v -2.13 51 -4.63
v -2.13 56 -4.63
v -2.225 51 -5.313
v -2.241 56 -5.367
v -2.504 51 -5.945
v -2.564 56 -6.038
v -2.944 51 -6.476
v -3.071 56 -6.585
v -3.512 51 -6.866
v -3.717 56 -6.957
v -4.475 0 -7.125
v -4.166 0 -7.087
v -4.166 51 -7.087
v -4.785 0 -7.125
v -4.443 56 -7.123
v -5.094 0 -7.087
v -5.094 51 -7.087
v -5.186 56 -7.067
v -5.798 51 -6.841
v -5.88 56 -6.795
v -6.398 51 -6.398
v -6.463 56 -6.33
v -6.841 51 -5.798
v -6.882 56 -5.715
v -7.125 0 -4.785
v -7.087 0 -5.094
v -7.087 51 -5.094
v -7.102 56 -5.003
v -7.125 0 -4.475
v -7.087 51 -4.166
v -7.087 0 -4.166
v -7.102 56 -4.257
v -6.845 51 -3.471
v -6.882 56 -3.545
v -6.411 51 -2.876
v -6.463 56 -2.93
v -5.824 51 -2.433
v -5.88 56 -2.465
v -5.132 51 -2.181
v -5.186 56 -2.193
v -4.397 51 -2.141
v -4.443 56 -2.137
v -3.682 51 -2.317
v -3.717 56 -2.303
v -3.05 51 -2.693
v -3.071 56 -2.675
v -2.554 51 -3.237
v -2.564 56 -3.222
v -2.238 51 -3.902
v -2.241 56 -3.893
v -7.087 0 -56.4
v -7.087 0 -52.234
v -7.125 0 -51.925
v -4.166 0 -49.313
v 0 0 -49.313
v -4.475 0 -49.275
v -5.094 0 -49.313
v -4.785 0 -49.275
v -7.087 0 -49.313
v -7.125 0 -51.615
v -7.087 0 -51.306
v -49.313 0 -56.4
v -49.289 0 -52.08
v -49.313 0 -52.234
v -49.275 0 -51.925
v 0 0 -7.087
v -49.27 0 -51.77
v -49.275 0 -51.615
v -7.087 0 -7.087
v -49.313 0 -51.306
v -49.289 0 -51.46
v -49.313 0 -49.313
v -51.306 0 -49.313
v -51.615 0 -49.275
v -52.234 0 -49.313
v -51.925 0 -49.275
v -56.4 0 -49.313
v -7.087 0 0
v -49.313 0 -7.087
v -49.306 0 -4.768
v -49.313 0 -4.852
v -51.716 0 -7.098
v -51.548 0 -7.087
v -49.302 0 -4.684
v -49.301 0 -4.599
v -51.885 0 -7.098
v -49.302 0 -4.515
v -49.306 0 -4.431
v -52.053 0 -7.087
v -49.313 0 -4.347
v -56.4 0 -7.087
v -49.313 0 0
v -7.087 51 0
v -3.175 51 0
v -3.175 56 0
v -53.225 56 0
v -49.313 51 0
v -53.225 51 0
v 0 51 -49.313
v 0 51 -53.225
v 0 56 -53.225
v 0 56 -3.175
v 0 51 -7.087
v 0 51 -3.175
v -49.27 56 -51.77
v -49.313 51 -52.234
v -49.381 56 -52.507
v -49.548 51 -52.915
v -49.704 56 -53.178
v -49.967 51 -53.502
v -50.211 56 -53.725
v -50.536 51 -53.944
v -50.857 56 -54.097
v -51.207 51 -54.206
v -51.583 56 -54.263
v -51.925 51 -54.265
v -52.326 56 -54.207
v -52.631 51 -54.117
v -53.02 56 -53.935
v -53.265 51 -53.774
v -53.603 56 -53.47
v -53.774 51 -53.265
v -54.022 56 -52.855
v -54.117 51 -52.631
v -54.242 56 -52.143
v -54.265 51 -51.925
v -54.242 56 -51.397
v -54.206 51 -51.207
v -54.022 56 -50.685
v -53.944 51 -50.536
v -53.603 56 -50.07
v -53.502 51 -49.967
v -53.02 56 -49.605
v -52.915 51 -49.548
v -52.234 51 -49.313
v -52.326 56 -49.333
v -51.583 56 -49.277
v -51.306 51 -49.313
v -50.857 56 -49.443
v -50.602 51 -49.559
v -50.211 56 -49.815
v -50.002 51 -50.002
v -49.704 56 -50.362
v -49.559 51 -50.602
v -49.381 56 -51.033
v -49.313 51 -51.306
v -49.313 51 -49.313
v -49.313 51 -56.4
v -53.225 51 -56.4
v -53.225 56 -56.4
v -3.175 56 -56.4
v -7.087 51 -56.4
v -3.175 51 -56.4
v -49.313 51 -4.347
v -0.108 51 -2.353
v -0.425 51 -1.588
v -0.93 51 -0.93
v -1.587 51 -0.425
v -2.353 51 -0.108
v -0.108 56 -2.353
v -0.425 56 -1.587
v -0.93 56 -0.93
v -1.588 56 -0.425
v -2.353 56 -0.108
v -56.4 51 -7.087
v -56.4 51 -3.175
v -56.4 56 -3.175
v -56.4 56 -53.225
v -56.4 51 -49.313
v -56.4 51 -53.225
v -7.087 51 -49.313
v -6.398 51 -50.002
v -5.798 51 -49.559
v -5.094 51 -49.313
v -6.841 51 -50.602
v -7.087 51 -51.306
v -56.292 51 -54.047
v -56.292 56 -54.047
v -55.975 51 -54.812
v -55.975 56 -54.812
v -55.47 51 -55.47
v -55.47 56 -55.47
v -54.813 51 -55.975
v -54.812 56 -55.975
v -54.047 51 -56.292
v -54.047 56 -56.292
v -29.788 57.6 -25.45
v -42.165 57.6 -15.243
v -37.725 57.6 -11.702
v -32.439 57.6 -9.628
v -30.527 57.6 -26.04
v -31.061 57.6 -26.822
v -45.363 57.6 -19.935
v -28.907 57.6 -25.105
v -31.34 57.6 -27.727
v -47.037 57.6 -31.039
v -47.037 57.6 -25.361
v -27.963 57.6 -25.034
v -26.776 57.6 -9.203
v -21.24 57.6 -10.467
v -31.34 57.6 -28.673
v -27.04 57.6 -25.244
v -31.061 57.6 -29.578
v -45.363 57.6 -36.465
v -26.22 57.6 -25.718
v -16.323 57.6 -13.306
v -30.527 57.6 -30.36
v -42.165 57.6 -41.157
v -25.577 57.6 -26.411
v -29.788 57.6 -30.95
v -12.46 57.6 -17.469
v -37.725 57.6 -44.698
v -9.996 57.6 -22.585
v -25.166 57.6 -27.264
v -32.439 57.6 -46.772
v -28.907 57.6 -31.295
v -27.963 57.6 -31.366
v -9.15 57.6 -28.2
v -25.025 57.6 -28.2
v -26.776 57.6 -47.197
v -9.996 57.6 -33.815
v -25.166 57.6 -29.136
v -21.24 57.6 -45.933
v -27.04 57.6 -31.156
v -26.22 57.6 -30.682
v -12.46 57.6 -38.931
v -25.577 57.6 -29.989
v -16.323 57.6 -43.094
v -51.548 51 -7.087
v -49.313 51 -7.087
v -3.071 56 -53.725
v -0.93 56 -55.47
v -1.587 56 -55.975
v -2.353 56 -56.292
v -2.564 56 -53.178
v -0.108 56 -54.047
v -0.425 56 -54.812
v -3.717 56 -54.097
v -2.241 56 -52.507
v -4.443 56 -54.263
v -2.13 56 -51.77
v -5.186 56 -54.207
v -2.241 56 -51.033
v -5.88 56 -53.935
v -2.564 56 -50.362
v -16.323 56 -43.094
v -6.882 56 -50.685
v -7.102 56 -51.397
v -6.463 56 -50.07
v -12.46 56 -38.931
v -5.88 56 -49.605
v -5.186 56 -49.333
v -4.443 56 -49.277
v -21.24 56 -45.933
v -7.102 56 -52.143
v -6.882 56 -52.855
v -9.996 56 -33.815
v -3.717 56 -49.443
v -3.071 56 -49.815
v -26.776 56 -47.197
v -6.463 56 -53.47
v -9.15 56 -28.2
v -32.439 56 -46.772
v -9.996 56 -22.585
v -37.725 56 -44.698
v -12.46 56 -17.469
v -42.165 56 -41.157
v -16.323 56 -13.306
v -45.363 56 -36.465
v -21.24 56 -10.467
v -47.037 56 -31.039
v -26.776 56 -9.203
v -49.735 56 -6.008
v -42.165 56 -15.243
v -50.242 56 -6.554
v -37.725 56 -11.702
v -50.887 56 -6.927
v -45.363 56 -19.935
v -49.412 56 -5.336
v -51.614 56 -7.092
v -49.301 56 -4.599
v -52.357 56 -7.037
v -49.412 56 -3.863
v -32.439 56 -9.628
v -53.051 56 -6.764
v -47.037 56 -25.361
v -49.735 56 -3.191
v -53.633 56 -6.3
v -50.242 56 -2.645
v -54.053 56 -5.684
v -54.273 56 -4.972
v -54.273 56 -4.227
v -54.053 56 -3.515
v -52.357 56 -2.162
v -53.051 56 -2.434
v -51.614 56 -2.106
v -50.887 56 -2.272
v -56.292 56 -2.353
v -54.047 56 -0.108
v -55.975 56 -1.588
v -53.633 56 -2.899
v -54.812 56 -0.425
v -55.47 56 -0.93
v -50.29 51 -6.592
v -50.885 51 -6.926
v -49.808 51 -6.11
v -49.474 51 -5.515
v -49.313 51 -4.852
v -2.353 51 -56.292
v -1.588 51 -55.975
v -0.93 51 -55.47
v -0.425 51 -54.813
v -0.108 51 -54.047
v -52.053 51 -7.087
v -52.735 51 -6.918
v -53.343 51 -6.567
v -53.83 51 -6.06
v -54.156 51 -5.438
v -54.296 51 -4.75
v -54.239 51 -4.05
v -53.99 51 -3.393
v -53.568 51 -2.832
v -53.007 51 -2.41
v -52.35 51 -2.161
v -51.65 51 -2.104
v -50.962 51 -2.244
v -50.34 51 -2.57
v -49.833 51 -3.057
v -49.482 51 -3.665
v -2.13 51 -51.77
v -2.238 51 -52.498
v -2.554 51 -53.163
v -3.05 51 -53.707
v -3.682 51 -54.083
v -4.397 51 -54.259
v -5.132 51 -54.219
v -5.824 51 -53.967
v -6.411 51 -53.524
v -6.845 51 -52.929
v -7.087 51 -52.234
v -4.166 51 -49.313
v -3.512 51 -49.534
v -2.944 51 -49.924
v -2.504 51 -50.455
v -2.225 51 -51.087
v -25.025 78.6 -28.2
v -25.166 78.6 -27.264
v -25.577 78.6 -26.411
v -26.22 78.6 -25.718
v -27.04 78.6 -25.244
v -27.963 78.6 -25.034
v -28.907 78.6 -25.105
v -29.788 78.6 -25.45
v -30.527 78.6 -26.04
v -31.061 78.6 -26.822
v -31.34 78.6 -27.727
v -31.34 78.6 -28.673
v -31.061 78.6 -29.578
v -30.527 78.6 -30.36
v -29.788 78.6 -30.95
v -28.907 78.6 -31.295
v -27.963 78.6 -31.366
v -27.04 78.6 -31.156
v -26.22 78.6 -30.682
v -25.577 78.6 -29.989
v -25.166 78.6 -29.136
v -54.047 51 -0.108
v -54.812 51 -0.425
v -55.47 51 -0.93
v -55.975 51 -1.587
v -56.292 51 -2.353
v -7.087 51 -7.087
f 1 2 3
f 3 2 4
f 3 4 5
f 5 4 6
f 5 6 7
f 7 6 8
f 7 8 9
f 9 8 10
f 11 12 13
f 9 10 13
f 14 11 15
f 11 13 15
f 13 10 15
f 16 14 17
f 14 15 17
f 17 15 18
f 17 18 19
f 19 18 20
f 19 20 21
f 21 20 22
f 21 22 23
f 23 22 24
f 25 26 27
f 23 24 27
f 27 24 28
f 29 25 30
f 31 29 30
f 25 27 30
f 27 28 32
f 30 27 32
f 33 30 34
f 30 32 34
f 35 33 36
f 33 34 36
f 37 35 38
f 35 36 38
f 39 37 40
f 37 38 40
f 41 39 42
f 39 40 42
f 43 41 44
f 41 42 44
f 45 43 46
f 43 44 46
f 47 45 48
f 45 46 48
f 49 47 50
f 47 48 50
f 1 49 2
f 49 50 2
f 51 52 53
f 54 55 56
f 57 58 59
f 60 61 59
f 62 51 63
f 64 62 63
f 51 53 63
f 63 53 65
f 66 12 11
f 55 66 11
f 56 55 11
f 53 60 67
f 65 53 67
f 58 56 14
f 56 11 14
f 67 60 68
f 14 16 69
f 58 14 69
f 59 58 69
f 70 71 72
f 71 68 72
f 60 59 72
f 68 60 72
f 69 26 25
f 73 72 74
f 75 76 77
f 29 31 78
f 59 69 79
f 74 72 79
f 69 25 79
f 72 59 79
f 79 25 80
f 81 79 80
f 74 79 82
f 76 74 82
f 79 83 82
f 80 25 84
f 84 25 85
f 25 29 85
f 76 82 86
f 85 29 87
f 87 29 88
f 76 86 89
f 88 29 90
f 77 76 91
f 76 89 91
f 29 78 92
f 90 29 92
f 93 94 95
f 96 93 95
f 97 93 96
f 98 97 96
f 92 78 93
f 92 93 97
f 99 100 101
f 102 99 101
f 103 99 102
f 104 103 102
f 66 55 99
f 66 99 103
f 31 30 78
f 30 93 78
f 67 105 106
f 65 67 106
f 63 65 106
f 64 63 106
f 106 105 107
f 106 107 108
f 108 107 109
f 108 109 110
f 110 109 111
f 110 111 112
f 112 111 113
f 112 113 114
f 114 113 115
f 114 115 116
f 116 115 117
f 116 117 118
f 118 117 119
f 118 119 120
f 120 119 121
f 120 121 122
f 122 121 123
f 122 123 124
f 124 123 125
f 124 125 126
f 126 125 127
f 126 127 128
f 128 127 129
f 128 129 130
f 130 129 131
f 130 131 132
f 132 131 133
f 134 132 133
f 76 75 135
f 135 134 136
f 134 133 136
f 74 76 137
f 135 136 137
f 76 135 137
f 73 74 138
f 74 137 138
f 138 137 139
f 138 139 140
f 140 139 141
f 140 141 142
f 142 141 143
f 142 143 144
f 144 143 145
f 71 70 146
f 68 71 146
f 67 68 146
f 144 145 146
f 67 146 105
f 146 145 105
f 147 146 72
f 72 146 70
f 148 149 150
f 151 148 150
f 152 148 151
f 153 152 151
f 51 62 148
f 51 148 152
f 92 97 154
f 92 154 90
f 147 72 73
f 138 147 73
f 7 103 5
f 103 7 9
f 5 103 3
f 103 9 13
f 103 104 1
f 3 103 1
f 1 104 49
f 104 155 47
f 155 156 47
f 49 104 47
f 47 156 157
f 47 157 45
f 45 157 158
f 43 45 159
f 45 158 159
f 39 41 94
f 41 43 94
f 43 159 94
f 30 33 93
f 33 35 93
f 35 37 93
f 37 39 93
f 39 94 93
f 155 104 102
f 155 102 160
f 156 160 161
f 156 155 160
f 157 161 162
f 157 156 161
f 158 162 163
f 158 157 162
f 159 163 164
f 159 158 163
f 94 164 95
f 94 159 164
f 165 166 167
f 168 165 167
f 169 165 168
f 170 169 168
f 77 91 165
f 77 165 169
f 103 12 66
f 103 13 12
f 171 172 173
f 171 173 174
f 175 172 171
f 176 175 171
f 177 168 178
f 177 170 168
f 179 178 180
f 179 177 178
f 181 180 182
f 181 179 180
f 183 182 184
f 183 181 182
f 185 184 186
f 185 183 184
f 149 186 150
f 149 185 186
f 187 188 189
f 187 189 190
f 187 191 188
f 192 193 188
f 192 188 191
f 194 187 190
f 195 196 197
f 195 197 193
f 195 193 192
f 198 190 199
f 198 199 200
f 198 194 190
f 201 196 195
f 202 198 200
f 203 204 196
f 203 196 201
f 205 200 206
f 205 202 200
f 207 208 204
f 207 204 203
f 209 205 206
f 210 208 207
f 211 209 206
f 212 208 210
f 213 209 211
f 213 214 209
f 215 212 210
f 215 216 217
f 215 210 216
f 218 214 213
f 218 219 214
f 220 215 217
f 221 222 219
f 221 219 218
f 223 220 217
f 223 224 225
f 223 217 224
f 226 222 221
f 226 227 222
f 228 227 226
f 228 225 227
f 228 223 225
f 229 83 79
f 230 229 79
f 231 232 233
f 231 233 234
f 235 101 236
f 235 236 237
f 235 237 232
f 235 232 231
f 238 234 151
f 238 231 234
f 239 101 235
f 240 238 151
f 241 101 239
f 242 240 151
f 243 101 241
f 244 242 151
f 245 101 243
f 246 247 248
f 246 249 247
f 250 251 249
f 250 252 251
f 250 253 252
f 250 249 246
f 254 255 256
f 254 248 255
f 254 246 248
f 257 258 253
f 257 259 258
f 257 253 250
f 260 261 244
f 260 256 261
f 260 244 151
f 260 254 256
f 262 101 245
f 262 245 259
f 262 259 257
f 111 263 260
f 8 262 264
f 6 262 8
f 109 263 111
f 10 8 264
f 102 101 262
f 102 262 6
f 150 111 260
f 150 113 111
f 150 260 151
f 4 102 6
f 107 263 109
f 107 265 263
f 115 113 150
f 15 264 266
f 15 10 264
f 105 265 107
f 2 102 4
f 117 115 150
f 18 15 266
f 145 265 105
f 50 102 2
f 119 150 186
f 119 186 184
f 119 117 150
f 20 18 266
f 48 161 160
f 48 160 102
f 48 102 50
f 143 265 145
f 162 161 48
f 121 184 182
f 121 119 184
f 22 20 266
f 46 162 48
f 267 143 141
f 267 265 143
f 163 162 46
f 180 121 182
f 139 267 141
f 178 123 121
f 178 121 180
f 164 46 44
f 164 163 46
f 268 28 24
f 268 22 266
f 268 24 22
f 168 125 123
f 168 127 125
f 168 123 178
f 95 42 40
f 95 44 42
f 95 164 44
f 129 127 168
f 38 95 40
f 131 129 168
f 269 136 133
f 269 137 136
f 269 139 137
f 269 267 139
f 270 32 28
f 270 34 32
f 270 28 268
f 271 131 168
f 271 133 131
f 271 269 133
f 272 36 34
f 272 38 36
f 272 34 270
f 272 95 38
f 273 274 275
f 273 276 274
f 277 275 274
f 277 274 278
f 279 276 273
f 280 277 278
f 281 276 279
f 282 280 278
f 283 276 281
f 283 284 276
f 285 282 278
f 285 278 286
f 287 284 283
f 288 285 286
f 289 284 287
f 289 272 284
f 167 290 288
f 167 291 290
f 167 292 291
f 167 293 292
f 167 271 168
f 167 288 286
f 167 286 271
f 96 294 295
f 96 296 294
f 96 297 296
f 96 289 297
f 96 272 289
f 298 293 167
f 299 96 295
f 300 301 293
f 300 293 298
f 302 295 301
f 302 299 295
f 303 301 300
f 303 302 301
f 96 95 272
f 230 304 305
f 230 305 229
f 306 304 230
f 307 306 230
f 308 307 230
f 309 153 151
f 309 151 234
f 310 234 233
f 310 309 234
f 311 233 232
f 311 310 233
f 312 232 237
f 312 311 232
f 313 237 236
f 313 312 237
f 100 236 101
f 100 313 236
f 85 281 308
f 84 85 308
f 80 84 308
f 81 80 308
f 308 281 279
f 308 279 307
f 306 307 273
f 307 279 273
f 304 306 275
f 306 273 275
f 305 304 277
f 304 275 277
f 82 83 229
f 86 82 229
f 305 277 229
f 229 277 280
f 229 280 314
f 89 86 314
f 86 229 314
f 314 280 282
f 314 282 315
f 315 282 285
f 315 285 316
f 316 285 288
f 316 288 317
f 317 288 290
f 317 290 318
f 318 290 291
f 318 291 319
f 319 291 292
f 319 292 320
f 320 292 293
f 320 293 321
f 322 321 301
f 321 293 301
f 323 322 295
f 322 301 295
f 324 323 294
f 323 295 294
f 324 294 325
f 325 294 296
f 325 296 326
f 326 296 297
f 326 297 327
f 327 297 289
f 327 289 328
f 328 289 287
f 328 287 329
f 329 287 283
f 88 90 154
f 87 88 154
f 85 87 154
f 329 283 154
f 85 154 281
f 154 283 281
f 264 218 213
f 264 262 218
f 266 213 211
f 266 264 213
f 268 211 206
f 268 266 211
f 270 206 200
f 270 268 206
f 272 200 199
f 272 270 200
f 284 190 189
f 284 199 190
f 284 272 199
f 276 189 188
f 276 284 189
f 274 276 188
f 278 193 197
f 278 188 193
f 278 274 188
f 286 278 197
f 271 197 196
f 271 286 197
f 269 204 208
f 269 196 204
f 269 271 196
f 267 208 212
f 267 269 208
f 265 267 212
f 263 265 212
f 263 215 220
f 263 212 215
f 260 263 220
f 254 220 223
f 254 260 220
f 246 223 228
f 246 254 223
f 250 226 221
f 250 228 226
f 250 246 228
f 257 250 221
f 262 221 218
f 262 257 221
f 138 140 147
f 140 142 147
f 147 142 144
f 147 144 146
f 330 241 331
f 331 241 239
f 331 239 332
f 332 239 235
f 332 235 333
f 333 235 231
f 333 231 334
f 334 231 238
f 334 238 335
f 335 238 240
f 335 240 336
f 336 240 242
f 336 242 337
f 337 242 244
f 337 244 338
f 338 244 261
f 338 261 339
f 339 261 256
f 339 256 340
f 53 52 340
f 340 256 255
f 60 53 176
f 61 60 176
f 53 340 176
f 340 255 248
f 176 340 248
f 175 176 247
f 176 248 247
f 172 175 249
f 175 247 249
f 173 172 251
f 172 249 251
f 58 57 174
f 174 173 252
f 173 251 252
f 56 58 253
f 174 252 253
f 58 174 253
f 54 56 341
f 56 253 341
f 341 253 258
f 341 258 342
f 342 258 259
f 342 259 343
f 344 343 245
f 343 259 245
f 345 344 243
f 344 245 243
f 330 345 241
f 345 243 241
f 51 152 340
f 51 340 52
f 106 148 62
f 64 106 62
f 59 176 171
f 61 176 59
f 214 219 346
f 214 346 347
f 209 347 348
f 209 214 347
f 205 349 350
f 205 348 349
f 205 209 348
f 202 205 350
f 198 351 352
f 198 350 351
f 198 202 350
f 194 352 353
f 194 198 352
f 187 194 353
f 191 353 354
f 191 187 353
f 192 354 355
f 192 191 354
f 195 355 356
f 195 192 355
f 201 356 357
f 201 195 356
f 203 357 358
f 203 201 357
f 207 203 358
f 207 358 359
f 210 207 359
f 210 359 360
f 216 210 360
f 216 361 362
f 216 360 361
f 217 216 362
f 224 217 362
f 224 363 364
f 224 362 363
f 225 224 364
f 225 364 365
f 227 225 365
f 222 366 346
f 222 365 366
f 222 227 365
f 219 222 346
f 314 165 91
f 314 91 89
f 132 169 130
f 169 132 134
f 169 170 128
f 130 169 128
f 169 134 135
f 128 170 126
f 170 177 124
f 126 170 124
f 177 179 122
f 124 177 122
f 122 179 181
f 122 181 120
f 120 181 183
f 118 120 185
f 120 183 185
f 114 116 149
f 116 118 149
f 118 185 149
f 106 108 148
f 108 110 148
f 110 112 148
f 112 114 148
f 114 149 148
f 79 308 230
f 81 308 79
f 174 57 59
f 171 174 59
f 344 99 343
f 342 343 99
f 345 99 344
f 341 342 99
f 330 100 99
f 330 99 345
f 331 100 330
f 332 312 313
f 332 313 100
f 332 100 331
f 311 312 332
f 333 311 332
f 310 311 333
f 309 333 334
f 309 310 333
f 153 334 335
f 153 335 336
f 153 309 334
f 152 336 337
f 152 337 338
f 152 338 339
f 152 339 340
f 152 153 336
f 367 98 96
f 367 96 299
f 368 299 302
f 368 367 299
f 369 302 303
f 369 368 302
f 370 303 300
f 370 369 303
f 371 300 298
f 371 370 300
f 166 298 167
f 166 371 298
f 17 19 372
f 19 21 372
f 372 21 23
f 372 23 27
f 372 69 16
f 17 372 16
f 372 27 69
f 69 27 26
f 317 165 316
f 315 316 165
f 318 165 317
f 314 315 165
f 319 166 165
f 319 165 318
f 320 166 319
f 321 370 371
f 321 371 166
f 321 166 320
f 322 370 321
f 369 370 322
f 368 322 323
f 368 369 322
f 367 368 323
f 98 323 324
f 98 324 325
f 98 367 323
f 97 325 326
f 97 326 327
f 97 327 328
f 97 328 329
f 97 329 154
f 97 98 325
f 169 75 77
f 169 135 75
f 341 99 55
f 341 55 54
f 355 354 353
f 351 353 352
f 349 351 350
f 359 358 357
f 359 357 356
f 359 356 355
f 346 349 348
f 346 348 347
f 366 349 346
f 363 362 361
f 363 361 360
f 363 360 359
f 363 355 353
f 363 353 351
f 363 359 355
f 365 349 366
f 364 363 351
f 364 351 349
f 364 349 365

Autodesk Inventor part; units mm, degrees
ref_plane "YZ Plane" through (0, 0, 0) normal (1, 0, 0) x (0, 1, 0)
ref_plane "XZ Plane" through (0, 0, 0) normal (0, 1, 0) x (-1, 0, 0)
ref_plane "XY Plane" through (0, 0, 0) normal (0, 0, 1) x (1, 0, 0)
sketch "Sketch1" plane through (0, 0, 0) normal (0, 1, 0) x (-1, 0, 0)
  line L0 (3.175, 0) -> (53.225, 0)
  line L1 (56.4, -3.175) -> (56.4, -53.225)
  line L2 (53.225, -56.4) -> (3.175, -56.4)
  line L3 (0, -53.225) -> (0, -3.175)
  arc A0 (56.4, -3.175) -> (53.225, 0) centre (53.225, -3.175) ccw
  arc A1 (3.175, 0) -> (0, -3.175) centre (3.175, -3.175) ccw
  arc A2 (0, -53.225) -> (3.175, -56.4) centre (3.175, -53.225) ccw
  arc A3 (53.225, -56.4) -> (56.4, -53.225) centre (53.225, -53.225) ccw
  point P0 (0, 0)
  point P1 (56.4, -56.4)
  point P2 (56.4, 0)
  point P3 (0, -56.4)
  dimension "d0" = 56.4
  dimension "d1" = 56.4
  dimension "d2" = 3.175
extrude "Extrusion1" add sketch "Sketch1" along normal blind 56
sketch "Sketch2" plane through (0, 56, 0) normal (0, 1, 0) x (1, 0, 0)
  line L0 (0, 0) -> (-56.4, 0) construction
  line L1 (-56.4, 0) -> (-56.4, 56.4) construction
  line L2 (-56.4, 56.4) -> (0, 56.4) construction
  line L3 (0, 56.4) -> (0, 0) construction
  line L4 (-56.4, 0) -> (0, 56.4) construction
  line L5 (-4.63, 4.63) -> (-51.77, 4.63) construction
  line L6 (-51.77, 4.63) -> (-51.77, 51.77) construction
  line L7 (-51.77, 51.77) -> (-4.63, 51.77) construction
  line L8 (-4.63, 51.77) -> (-4.63, 4.63) construction
  line L9 (-4.63, 4.63) -> (-51.77, 51.77) construction
  line L10 (-51.77, 4.63) -> (-4.63, 51.77) construction
  circle A0 centre (-51.8006, 4.5994) radius 2.5
  circle A1 centre (-51.77, 51.77) radius 2.5
  circle A2 centre (-4.63, 51.77) radius 2.5
  circle A3 centre (-4.63, 4.63) radius 2.5
  point P0 (-28.2, 28.2)
  dimension "d5" = 47.14
  dimension "d6" = 47.14
  dimension "d7" = 5
  dimension "d8" = 5
  dimension "d9" = 5
  dimension "d10" = 5
sketch "Sketch3" plane through (0, 56, 0) normal (0, 1, 0) x (1, 0, 0)
  line L0 (0, 0) -> (-56.4, 56.4) construction
  circle A0 centre (-28.2, 28.2) radius 19.05
  dimension "d18" = 38.1
extrude "Extrusion2" add sketch "Sketch3" along normal blind 1.6
sketch "Sketch4" plane through (-28.2, 57.6, -28.2) normal (0, 1, 0) x (1, 0, 0)
  circle A0 centre (0, 0) radius 3.175
  point P0 (28.2, -28.2)
  dimension "d21" = 6.35
extrude "Extrusion3" add sketch "Sketch4" along normal blind 21
extrude "Extrusion4" cut sketch "Sketch2" against normal through all
sketch "Sketch5" plane through (-53.225, 0, 0) normal (0, 0, 1) x (1, 0, 0)
  line L0 (-3.175, 0) -> (-3.175, 56) construction
  line L1 (-3.175, 56) -> (3.9116, 56) construction
  line L2 (3.9116, 56) -> (3.9116, 51) construction
  line L3 (3.9116, 51) -> (-3.175, 51) construction
  line L4 (-3.175, 51) -> (-3.175, 56) construction
  line L5 (-3.175, 51) -> (3.9116, 51)
  line L6 (3.9116, 51) -> (3.9116, 0)
  line L7 (3.9116, 0) -> (-3.175, 0)
  line L8 (-3.175, 0) -> (-3.175, 51)
  line L9 (50.05, 0) -> (0, 0) construction
  line L10 (25.025, 0) -> (25.025, 56) construction
  line L11 (50.05, 56) -> (0, 56) construction
  line L12 (53.225, 0) -> (53.225, 56) construction
  line L13 (53.225, 56) -> (46.1384, 56) construction
  line L14 (46.1384, 56) -> (46.1384, 51) construction
  line L15 (46.1384, 51) -> (53.225, 51) construction
  line L16 (53.225, 51) -> (53.225, 56) construction
  line L17 (53.225, 51) -> (46.1384, 51)
  line L18 (46.1384, 51) -> (46.1384, 0)
  line L19 (46.1384, 0) -> (53.225, 0)
  line L20 (53.225, 0) -> (53.225, 51)
  point P0 (53.225, 0)
  point P1 (55.3116, 56)
  dimension "d26" = 7.0866
  dimension "d27" = 5
extrude "Extrusion5" cut sketch "Sketch5" against normal blind 7.0866
sketch "Sketch6" plane through (-3.175, 0, -56.4) normal (0, 0, -1) x (-1, 0, 0)
  line L0 (-3.175, 0) -> (-3.175, 56) construction
  line L1 (-3.175, 56) -> (3.9116, 56) construction
  line L2 (3.9116, 56) -> (3.9116, 51) construction
  line L3 (3.9116, 51) -> (-3.175, 51) construction
  line L4 (-3.175, 51) -> (-3.175, 56) construction
  line L5 (-3.175, 51) -> (3.9116, 51)
  line L6 (3.9116, 51) -> (3.9116, 0)
  line L7 (3.9116, 0) -> (-3.175, 0)
  line L8 (-3.175, 0) -> (-3.175, 51)
  line L9 (50.05, 0) -> (0, 0) construction
  line L10 (25.025, 0) -> (25.025, 56) construction
  line L11 (50.05, 56) -> (0, 56) construction
  line L12 (53.225, 0) -> (53.225, 56) construction
  line L13 (53.225, 56) -> (46.1384, 56) construction
  line L14 (46.1384, 56) -> (46.1384, 51) construction
  line L15 (46.1384, 51) -> (53.225, 51) construction
  line L16 (53.225, 51) -> (53.225, 56) construction
  line L17 (53.225, 51) -> (46.1384, 51)
  line L18 (46.1384, 51) -> (46.1384, 0)
  line L19 (46.1384, 0) -> (53.225, 0)
  line L20 (53.225, 0) -> (53.225, 51)
  point P0 (-3.175, 0)
  point P1 (53.225, 0)
  point P2 (55.3116, 56)
  dimension "d32" = 7.0866
  dimension "d33" = 5
extrude "Extrusion6" cut sketch "Sketch6" against normal blind 7.0866
properties part number "NEMA23 Motor"
